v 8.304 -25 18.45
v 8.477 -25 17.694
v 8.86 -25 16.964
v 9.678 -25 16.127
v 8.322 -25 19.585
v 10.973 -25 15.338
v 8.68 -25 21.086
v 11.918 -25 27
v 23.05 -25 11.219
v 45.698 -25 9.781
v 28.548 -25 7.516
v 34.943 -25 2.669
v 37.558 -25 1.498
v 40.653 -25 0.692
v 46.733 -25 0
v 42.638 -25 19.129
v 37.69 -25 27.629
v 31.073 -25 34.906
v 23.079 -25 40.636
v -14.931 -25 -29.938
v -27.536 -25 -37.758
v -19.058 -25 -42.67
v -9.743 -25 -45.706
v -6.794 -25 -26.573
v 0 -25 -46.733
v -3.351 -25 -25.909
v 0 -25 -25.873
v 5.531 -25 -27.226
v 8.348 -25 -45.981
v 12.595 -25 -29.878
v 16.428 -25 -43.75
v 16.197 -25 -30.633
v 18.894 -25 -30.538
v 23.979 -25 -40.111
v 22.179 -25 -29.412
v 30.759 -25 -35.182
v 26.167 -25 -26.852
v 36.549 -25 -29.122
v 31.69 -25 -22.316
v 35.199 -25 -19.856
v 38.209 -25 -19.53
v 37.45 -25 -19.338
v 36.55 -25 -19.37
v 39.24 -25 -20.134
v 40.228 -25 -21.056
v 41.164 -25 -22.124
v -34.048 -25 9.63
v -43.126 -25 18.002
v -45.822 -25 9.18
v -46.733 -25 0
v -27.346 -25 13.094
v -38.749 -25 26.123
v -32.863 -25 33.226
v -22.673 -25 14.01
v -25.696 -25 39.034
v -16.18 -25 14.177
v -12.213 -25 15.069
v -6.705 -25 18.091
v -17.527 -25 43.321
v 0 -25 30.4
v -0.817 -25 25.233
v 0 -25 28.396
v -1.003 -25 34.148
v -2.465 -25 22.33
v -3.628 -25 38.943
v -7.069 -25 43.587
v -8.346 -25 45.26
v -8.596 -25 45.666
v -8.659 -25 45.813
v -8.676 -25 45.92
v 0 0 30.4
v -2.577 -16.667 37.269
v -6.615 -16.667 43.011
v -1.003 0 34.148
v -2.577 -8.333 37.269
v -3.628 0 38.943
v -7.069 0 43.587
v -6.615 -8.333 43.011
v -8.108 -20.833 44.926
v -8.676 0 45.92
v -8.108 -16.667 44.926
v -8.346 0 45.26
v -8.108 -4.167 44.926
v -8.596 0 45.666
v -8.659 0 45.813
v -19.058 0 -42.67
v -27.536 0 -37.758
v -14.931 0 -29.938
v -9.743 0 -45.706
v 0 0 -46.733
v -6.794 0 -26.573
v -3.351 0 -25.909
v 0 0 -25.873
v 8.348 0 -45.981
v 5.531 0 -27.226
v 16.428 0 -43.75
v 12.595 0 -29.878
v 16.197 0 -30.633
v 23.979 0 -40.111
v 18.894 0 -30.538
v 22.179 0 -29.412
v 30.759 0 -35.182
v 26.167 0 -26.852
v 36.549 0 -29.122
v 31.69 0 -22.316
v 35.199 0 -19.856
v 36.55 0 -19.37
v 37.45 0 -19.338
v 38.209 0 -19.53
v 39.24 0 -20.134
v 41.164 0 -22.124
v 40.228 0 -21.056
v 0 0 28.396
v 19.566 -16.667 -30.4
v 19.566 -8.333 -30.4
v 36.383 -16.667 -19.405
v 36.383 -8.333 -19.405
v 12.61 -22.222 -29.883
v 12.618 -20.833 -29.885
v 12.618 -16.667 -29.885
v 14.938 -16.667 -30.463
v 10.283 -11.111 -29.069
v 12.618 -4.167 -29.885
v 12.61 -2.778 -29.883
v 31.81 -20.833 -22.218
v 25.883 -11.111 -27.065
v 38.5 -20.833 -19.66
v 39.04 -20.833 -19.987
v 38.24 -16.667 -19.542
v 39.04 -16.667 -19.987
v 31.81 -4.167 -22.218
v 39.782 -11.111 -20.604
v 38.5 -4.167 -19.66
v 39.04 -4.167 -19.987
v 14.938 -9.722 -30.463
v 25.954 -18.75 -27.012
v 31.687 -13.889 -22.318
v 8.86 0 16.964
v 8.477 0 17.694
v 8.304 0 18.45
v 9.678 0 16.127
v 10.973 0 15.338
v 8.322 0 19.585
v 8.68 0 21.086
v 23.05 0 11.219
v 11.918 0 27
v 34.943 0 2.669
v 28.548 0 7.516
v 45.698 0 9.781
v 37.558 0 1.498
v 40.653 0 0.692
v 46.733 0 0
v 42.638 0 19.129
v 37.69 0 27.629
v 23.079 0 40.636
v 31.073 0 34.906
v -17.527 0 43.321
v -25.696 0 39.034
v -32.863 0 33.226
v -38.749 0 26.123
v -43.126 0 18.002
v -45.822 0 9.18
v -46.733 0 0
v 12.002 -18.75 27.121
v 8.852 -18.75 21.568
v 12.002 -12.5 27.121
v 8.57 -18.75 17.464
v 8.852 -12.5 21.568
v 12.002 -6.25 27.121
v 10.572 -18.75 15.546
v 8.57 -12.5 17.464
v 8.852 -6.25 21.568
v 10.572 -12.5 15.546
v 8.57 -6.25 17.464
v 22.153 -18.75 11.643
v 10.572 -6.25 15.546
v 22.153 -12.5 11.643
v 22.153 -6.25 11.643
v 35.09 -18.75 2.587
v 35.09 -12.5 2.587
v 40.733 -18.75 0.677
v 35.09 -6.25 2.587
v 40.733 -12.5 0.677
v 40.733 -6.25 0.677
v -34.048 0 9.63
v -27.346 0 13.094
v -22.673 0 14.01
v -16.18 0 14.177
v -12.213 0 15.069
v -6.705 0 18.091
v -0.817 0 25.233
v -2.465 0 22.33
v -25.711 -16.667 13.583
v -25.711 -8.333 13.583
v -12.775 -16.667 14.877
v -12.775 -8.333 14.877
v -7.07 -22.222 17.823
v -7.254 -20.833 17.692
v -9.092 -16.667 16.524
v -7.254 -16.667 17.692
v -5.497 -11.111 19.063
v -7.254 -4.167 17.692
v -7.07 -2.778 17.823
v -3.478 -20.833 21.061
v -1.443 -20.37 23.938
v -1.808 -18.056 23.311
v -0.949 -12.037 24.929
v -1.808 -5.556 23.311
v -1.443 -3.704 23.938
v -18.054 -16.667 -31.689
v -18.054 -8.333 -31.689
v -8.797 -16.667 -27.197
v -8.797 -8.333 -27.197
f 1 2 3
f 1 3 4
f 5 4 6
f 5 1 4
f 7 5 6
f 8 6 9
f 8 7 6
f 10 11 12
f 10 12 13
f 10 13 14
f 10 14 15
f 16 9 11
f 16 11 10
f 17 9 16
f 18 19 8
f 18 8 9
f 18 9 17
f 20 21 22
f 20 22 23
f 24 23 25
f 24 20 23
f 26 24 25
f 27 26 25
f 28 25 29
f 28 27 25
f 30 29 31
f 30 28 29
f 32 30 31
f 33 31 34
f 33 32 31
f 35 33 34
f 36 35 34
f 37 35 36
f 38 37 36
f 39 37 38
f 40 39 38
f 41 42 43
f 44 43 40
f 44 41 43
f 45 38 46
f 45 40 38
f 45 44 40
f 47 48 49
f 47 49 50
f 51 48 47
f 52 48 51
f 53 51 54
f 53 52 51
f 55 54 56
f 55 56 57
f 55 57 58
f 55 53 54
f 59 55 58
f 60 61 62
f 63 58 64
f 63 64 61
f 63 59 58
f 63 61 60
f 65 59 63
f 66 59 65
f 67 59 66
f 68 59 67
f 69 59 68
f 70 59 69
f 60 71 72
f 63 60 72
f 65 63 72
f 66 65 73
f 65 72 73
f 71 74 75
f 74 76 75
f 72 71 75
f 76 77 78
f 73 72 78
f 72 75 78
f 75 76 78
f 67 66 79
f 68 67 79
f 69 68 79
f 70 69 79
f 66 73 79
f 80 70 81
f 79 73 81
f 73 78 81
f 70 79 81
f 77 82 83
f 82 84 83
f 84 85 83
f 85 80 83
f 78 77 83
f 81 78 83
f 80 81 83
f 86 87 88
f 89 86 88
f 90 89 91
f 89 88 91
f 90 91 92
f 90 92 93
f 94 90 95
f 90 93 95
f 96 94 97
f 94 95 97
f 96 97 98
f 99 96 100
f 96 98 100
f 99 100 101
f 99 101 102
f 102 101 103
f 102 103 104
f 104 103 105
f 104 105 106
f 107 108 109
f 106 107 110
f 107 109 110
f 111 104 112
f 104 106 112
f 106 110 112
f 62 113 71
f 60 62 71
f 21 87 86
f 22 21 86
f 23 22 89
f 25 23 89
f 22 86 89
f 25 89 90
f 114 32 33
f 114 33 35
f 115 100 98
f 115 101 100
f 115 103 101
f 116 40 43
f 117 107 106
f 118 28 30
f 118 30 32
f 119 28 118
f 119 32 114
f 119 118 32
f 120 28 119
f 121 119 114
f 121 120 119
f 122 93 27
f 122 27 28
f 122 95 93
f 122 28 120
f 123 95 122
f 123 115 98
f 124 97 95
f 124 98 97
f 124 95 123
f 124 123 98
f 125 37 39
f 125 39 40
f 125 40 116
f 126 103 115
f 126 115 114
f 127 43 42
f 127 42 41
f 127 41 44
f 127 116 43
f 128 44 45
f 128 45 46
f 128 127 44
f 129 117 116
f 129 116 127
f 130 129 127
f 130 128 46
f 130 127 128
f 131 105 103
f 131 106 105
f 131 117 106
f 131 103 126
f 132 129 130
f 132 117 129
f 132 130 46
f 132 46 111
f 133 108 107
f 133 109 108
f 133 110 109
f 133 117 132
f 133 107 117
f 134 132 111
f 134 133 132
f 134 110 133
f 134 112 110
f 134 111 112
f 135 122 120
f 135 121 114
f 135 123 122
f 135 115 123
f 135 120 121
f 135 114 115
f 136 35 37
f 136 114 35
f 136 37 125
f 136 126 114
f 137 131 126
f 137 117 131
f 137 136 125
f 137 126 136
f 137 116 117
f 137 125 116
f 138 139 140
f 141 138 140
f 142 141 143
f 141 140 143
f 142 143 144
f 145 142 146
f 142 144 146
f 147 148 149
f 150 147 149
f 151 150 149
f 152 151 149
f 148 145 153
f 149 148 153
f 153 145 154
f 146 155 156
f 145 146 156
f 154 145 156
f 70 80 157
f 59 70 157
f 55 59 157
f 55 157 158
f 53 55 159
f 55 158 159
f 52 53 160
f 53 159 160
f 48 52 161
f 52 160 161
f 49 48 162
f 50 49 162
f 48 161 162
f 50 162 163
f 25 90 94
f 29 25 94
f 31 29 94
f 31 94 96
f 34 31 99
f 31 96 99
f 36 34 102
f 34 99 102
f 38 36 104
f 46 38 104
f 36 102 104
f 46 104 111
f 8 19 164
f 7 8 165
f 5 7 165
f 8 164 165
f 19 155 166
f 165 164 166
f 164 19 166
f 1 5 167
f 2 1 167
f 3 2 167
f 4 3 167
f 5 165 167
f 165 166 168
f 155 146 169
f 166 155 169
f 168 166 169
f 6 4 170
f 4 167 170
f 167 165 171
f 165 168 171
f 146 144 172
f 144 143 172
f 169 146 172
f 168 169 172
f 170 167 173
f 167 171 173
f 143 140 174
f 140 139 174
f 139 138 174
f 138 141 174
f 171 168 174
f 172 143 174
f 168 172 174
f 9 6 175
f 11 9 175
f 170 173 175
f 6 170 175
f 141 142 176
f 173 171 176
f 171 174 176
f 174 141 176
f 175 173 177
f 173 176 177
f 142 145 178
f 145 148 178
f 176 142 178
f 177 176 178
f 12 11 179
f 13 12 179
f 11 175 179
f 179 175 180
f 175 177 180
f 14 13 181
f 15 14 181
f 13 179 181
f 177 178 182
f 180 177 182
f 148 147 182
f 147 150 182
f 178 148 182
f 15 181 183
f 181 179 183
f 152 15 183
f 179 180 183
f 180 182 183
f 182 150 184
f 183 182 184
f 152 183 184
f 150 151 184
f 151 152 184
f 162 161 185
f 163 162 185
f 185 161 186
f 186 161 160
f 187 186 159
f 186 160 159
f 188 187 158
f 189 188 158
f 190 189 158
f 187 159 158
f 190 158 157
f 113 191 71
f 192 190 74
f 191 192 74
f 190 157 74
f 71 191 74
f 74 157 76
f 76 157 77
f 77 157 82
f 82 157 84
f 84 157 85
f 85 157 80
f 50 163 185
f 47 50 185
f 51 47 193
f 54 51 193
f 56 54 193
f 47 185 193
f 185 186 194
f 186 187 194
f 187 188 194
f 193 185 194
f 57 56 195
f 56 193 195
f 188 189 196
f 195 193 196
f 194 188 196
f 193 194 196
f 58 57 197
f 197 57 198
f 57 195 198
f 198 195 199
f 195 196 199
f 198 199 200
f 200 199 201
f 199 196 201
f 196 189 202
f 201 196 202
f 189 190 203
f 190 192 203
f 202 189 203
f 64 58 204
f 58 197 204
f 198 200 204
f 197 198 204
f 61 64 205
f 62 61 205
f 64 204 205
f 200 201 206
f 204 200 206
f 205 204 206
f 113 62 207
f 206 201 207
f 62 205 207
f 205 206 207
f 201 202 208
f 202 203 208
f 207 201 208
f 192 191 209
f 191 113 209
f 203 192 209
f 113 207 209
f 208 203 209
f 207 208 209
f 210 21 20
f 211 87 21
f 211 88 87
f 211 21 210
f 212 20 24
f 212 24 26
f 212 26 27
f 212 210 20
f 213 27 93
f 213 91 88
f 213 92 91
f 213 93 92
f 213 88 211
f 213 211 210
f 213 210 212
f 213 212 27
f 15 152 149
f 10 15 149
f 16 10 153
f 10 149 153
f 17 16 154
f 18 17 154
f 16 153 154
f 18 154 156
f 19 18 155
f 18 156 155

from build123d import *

# Parameters (mm, degrees)
F1_DEPTH = 25


with BuildPart() as f1:
    # F0 (on Front) → F1 (new body)
    with BuildSketch(Plane.XZ):
        with BuildLine():
            ThreePointArc((0, -46.7325523496), (23.9794130672, -40.1113350321), (41.1638664294, -22.1239135255))
            add(Edge.make_bspline(
                [(0, -25.8726906031), (6.9460121025, -26.5200230854), (19.4430496575, -37.3796151953), (35.8389621567, -15.8579760057), (39.8116937231, -20.5297392688), (41.1638664294, -22.1239135255)],
                knots=[0.3262601526, 0.3262601526, 0.3262601526, 0.3262601526, 0.5932413683, 0.8602875124, 1, 1, 1, 1], degree=3))
            Line((0, -25.8726906031), (0, -46.7325523496))
        make_face()
        with BuildLine():
            ThreePointArc((-27.5359584967, -37.7584750589), (-14.4807033112, -44.4324282559), (0, -46.7325523496))
            Line((0, -46.7325523496), (0, -25.8726906031))
            add(Edge.make_bspline(
                [(-27.5359584967, -37.7584750589), (-18.0192757453, -31.43155502), (-8.4882637239, -25.0816282287), (0, -25.8726906031)],
                knots=[0, 0, 0, 0, 0.3262601526, 0.3262601526, 0.3262601526, 0.3262601526], degree=3))
        make_face()
    extrude(amount=F1_DEPTH)


with BuildPart() as f1b:
    # F0 (on Front) → F1, piece 2 (new body)
    with BuildSketch(Plane.XZ):
        with BuildLine():
            add(Edge.make_bspline(
                [(23.0786329916, 40.6362910259), (14.8458867962, 31.199090258), (0.5532964917, 14.8128759439), (24.15531803, 13.5550016973), (34.0066078799, 0.9909495936), (42.6937699961, 0.314529392), (46.7325523496, 0)],
                knots=[0, 0, 0, 0, 0.3168874963, 0.5498677314, 0.7906990608, 1, 1, 1, 1], degree=3))
            ThreePointArc((46.7325523496, 0), (40.3884567268, 23.5096578523), (23.0786329916, 40.6362910259))
        make_face()
    extrude(amount=F1_DEPTH)


with BuildPart() as f1c:
    # F0 (on Front) → F1, piece 3 (new body)
    with BuildSketch(Plane.XZ):
        with BuildLine():
            ThreePointArc((-8.6755959344, 45.9202077988), (-35.98169111, 29.8202842704), (-46.7325523496, 0))
            add(Edge.make_bspline(
                [(-46.7325523496, 0), (-39.2877960747, 6.0523459804), (-26.4744760988, 16.4660861589), (-13.3450562095, 11.8621347674), (-0.6484757808, 21.9680362875), (0, 28.395603164)],
                knots=[0, 0, 0, 0, 0.2775714971, 0.4776252056, 0.7032967279, 0.7032967279, 0.7032967279, 0.7032967279], degree=3))
            Line((0, 28.395603164), (0, 30.4004121572))
            add(Edge.make_bspline(
                [(0, 30.4004121572), (-0.6991251785, 37.2633190715), (-8.7504834545, 44.9960028277), (-8.6755959344, 45.9202077988)],
                knots=[0.7263978111, 0.7263978111, 0.7263978111, 0.7263978111, 0.9603498766, 0.9603498766, 0.9603498766, 0.9603498766], degree=3))
        make_face()
    extrude(amount=F1_DEPTH)


solid = Compound([f1.part, f1b.part, f1c.part])
